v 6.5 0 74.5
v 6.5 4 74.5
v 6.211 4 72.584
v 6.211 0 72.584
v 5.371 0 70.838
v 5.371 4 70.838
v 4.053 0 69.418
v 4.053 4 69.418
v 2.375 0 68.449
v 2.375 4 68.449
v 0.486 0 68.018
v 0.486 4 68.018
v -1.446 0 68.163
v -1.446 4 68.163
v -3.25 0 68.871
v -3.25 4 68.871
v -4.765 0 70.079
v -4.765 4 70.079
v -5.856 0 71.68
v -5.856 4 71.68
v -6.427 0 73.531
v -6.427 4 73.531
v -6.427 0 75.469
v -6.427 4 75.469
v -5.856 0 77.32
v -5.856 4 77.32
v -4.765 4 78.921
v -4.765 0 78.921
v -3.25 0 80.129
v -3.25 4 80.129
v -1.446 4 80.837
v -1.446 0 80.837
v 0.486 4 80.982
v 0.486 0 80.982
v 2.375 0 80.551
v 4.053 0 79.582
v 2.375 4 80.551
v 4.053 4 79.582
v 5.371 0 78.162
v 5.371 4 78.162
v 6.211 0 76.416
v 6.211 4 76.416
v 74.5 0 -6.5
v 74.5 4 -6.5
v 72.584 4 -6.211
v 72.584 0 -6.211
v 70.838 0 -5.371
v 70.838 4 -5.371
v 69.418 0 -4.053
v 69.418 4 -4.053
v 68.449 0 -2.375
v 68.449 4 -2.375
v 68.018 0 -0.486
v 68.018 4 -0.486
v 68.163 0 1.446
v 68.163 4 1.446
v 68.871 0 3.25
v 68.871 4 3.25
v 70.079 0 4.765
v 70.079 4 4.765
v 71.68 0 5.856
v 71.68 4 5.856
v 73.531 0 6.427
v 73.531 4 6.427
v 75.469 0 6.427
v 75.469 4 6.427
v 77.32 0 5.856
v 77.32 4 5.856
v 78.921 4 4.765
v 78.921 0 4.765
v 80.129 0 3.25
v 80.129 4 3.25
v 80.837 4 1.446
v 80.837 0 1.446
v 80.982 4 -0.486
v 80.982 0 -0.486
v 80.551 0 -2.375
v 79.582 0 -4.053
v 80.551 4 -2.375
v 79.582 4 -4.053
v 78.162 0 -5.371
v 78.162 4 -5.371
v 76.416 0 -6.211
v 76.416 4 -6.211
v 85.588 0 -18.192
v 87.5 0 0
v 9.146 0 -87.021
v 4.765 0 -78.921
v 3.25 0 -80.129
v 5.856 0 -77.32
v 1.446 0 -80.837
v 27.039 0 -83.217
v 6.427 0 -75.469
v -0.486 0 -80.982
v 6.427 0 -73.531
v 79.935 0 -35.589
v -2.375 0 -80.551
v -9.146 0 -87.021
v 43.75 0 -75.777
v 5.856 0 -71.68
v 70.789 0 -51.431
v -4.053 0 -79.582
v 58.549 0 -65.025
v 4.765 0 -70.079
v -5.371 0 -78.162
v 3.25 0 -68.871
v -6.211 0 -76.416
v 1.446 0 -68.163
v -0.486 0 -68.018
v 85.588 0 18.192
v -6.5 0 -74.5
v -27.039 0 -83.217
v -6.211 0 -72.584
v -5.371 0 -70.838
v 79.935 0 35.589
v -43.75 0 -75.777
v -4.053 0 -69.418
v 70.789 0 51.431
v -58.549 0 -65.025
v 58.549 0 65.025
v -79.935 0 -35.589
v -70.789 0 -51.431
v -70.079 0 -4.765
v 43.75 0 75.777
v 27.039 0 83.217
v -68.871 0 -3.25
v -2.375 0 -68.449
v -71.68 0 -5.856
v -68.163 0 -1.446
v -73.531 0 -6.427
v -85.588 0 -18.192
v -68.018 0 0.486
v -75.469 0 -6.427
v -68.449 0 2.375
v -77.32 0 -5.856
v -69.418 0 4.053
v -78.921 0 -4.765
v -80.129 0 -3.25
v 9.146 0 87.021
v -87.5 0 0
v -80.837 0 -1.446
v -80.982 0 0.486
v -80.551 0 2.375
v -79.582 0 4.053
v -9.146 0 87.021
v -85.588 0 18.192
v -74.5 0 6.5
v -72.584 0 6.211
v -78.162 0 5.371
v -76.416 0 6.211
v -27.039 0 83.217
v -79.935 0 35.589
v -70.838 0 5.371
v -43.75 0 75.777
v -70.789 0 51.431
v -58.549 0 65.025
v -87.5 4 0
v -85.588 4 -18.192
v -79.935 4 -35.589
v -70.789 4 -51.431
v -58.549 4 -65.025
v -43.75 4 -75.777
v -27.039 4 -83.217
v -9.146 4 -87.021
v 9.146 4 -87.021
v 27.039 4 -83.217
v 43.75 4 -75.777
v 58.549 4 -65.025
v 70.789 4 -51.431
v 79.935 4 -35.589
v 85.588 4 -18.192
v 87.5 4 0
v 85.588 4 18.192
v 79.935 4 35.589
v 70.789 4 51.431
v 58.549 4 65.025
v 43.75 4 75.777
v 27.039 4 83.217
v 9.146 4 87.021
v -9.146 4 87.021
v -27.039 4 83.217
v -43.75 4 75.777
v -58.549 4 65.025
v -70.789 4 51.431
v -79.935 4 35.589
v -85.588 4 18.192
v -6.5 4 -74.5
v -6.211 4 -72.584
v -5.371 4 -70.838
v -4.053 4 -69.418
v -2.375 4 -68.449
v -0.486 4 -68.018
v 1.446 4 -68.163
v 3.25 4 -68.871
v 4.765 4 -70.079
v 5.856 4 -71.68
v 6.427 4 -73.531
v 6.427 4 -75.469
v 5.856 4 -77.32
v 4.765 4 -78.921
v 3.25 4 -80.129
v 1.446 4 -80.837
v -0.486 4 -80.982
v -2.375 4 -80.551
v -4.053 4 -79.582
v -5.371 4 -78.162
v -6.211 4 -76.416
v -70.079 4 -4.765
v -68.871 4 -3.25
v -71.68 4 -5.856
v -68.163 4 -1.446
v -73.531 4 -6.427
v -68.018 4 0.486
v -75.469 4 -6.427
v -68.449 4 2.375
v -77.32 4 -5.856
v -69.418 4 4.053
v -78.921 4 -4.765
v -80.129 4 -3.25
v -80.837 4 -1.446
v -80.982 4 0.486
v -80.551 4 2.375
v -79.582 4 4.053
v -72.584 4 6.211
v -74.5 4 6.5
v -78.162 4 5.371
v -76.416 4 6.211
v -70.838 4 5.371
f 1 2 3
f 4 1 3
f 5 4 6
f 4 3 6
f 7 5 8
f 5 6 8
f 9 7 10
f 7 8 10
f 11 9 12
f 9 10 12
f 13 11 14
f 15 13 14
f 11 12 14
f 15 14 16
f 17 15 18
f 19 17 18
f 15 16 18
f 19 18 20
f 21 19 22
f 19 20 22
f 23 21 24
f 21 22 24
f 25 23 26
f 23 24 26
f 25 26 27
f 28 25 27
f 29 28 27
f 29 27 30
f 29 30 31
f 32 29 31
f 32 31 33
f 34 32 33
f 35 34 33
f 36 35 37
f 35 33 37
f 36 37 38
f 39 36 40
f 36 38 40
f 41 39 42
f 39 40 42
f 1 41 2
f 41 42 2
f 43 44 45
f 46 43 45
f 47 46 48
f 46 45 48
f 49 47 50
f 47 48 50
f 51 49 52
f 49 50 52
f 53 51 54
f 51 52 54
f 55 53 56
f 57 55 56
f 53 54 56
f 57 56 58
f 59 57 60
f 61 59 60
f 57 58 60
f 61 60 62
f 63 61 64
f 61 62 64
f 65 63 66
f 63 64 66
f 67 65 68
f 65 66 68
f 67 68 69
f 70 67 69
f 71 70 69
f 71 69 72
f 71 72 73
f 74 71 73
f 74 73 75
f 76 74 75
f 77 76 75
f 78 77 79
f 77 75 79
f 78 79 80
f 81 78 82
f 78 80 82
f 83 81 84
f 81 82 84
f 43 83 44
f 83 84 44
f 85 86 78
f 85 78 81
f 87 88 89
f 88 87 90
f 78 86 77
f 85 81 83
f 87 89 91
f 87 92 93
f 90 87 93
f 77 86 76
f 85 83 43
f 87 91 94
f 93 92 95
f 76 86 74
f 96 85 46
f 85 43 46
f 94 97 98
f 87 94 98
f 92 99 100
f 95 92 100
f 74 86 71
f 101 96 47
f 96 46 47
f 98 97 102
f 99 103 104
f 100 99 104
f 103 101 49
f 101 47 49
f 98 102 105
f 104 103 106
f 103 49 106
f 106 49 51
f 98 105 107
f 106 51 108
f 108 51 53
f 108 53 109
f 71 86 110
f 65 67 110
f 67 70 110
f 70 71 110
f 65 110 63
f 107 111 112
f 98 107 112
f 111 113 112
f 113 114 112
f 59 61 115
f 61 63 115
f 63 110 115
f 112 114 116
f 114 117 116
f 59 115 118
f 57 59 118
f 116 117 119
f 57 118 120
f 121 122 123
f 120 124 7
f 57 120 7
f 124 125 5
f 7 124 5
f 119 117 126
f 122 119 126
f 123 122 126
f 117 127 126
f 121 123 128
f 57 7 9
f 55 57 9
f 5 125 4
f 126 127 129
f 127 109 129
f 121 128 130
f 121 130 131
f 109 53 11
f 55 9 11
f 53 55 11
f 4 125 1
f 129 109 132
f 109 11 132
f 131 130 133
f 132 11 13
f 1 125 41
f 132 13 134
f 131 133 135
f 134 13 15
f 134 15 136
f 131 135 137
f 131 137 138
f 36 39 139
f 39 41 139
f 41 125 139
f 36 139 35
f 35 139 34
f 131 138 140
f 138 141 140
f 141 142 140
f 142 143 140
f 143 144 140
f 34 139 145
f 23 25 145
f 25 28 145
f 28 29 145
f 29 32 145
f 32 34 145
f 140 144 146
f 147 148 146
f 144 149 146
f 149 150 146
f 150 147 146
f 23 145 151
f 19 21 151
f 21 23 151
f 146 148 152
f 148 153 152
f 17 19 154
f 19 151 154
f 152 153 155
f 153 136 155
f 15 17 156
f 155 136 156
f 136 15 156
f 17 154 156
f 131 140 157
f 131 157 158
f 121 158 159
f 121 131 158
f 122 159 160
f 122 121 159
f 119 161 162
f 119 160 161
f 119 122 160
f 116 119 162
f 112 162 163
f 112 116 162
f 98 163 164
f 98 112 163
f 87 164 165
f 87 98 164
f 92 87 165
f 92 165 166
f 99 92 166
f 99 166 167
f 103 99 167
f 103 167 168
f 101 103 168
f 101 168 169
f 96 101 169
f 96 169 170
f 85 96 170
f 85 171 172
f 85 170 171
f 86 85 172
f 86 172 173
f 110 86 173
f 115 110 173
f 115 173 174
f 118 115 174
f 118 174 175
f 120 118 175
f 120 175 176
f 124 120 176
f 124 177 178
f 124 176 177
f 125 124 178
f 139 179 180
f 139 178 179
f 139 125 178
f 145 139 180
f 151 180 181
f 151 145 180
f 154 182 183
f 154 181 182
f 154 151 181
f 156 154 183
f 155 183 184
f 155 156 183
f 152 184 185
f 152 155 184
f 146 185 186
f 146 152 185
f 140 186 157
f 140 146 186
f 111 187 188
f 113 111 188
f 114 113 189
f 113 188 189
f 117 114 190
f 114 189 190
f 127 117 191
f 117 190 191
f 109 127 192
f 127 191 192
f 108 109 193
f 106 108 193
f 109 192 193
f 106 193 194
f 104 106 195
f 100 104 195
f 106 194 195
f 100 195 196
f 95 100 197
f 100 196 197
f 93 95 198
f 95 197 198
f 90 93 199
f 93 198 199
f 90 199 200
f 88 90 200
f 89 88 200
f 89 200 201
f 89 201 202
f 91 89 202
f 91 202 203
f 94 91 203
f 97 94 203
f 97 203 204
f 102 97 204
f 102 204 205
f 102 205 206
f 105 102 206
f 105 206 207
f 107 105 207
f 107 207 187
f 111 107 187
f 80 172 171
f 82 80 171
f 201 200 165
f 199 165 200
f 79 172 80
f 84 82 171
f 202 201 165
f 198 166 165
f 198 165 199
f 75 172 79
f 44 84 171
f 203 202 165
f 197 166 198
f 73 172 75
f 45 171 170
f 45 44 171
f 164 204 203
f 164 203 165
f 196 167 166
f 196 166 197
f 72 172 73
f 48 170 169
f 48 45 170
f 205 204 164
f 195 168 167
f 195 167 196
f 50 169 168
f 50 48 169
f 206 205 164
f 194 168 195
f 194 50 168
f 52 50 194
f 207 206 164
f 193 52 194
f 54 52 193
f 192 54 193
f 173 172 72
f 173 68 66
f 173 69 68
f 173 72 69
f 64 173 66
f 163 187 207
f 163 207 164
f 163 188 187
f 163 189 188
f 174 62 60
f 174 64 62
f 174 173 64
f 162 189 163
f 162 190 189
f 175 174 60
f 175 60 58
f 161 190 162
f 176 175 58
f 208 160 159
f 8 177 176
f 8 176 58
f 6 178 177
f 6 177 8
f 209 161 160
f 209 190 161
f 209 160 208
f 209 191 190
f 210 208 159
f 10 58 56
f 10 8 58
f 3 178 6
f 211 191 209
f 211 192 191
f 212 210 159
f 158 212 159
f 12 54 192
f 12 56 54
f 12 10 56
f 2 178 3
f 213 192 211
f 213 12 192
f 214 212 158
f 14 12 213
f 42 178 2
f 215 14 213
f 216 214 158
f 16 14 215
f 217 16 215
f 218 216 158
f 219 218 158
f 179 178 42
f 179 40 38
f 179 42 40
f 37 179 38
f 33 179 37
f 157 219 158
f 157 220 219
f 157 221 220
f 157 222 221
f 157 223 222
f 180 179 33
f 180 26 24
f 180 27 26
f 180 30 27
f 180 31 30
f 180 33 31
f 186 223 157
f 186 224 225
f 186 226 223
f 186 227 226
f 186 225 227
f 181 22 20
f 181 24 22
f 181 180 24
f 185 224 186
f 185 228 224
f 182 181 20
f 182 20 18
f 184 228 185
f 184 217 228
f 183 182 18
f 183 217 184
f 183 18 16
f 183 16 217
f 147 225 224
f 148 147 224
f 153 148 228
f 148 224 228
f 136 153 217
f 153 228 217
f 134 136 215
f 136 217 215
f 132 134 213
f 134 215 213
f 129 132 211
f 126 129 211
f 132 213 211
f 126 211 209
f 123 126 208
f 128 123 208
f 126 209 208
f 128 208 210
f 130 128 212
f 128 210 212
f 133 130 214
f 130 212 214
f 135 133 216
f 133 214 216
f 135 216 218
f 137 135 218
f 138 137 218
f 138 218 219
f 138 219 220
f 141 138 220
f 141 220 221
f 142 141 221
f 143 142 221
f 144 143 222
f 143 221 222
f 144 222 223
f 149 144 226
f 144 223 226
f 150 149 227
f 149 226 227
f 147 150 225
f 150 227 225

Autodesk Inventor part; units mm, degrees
ref_plane "YZ Plane" through (0, 0, 0) normal (1, 0, 0) x (0, 1, 0)
ref_plane "XZ Plane" through (0, 0, 0) normal (0, 1, 0) x (-1, 0, 0)
ref_plane "XY Plane" through (0, 0, 0) normal (0, 0, 1) x (1, 0, 0)
sketch "Sketch1" plane through (0, 0, 0) normal (0, 1, 0) x (-1, 0, 0)
  circle A0 centre (0, 0) radius 87.5
  dimension "d0" = 175
extrude "Plate1" add sketch "Sketch1" along normal blind 4
sketch "Sketch2" plane through (0, 4, 0) normal (0, 1, 0) x (1, 0, 0)
  line L0 (-40, -40) -> (40, -40) construction
  line L1 (40, -40) -> (40, 40) construction
  line L2 (40, 40) -> (-40, 40) construction
  line L3 (-40, 40) -> (-40, -40) construction
  line L4 (40, -40) -> (-40, 40) construction
  circle A0 centre (0, 0) radius 87.5 projected
  line L5 (0, 0) -> (0, -87.5) construction
  circle A1 centre (0, -74.5) radius 6.5
  dimension "d2" = 80
  dimension "d3" = 80
  dimension "d16" = 13
  dimension "d23" = 74.5
extrude "Extrusion1" cut sketch "Sketch2" against normal through all contours A1
pattern_circular "Circular Pattern1" count 4 over 360 about axis through (0, -10, 0) along (0, 1, 0) of "Extrusion1"
sketch "Sketch3" plane through (0, 4, 0) normal (0, 1, 0) x (1, 0, 0)
  line L0 (9.823, 55.7091) -> (-55.7091, 9.823)
  line L1 (-55.7091, 9.823) -> (-9.823, -55.7091)
  line L2 (-9.823, -55.7091) -> (55.7091, -9.823)
  line L3 (55.7091, -9.823) -> (9.823, 55.7091) construction
  line L4 (32.7661, 22.9431) -> (-32.7661, -22.9431) construction
  line L5 (0, 0) -> (26.1739, 0) construction
  line L6 (-55.7091, -9.823) -> (9.823, -55.7091)
  line L7 (9.823, -55.7091) -> (55.7091, 9.823)
  line L8 (55.7091, 9.823) -> (-9.823, 55.7091) construction
  line L9 (-9.823, 55.7091) -> (-55.7091, -9.823)
  line L10 (22.9431, 32.7661) -> (-22.9431, -32.7661)
  line L11 (9.823, -55.7091) -> (39.823, -55.7091)
  line L12 (-55.7091, 9.823) -> (-55.7091, 39.823)
  dimension "d18" = 80
  dimension "d19" = 35
  dimension "d20" = 55
  dimension "d21" = 30
  dimension "d22" = 30
mark "Mark1"
equation "\"d1\" = Thickness"
equation "\"BendReliefWidth\" = Thickness"
equation "\"BendReliefDepth\" = 0.5 * Thickness"
equation "\"CornerReliefSize\" = 4 * Thickness"
equation "\"MinimumRemnant\" = 2 * Thickness"
equation "\"TransitionRadius\" = BendRadius"
equation "\"JacobiRadiusSize\" = BendRadius"
equation "\"GapSize\" = Thickness"
equation "\"Thickness\" = 4"
equation "\"BendRadius\" = 5"
properties part number "MSC 904 FLANGE BASE TUBE" material "Stainless Steel"
